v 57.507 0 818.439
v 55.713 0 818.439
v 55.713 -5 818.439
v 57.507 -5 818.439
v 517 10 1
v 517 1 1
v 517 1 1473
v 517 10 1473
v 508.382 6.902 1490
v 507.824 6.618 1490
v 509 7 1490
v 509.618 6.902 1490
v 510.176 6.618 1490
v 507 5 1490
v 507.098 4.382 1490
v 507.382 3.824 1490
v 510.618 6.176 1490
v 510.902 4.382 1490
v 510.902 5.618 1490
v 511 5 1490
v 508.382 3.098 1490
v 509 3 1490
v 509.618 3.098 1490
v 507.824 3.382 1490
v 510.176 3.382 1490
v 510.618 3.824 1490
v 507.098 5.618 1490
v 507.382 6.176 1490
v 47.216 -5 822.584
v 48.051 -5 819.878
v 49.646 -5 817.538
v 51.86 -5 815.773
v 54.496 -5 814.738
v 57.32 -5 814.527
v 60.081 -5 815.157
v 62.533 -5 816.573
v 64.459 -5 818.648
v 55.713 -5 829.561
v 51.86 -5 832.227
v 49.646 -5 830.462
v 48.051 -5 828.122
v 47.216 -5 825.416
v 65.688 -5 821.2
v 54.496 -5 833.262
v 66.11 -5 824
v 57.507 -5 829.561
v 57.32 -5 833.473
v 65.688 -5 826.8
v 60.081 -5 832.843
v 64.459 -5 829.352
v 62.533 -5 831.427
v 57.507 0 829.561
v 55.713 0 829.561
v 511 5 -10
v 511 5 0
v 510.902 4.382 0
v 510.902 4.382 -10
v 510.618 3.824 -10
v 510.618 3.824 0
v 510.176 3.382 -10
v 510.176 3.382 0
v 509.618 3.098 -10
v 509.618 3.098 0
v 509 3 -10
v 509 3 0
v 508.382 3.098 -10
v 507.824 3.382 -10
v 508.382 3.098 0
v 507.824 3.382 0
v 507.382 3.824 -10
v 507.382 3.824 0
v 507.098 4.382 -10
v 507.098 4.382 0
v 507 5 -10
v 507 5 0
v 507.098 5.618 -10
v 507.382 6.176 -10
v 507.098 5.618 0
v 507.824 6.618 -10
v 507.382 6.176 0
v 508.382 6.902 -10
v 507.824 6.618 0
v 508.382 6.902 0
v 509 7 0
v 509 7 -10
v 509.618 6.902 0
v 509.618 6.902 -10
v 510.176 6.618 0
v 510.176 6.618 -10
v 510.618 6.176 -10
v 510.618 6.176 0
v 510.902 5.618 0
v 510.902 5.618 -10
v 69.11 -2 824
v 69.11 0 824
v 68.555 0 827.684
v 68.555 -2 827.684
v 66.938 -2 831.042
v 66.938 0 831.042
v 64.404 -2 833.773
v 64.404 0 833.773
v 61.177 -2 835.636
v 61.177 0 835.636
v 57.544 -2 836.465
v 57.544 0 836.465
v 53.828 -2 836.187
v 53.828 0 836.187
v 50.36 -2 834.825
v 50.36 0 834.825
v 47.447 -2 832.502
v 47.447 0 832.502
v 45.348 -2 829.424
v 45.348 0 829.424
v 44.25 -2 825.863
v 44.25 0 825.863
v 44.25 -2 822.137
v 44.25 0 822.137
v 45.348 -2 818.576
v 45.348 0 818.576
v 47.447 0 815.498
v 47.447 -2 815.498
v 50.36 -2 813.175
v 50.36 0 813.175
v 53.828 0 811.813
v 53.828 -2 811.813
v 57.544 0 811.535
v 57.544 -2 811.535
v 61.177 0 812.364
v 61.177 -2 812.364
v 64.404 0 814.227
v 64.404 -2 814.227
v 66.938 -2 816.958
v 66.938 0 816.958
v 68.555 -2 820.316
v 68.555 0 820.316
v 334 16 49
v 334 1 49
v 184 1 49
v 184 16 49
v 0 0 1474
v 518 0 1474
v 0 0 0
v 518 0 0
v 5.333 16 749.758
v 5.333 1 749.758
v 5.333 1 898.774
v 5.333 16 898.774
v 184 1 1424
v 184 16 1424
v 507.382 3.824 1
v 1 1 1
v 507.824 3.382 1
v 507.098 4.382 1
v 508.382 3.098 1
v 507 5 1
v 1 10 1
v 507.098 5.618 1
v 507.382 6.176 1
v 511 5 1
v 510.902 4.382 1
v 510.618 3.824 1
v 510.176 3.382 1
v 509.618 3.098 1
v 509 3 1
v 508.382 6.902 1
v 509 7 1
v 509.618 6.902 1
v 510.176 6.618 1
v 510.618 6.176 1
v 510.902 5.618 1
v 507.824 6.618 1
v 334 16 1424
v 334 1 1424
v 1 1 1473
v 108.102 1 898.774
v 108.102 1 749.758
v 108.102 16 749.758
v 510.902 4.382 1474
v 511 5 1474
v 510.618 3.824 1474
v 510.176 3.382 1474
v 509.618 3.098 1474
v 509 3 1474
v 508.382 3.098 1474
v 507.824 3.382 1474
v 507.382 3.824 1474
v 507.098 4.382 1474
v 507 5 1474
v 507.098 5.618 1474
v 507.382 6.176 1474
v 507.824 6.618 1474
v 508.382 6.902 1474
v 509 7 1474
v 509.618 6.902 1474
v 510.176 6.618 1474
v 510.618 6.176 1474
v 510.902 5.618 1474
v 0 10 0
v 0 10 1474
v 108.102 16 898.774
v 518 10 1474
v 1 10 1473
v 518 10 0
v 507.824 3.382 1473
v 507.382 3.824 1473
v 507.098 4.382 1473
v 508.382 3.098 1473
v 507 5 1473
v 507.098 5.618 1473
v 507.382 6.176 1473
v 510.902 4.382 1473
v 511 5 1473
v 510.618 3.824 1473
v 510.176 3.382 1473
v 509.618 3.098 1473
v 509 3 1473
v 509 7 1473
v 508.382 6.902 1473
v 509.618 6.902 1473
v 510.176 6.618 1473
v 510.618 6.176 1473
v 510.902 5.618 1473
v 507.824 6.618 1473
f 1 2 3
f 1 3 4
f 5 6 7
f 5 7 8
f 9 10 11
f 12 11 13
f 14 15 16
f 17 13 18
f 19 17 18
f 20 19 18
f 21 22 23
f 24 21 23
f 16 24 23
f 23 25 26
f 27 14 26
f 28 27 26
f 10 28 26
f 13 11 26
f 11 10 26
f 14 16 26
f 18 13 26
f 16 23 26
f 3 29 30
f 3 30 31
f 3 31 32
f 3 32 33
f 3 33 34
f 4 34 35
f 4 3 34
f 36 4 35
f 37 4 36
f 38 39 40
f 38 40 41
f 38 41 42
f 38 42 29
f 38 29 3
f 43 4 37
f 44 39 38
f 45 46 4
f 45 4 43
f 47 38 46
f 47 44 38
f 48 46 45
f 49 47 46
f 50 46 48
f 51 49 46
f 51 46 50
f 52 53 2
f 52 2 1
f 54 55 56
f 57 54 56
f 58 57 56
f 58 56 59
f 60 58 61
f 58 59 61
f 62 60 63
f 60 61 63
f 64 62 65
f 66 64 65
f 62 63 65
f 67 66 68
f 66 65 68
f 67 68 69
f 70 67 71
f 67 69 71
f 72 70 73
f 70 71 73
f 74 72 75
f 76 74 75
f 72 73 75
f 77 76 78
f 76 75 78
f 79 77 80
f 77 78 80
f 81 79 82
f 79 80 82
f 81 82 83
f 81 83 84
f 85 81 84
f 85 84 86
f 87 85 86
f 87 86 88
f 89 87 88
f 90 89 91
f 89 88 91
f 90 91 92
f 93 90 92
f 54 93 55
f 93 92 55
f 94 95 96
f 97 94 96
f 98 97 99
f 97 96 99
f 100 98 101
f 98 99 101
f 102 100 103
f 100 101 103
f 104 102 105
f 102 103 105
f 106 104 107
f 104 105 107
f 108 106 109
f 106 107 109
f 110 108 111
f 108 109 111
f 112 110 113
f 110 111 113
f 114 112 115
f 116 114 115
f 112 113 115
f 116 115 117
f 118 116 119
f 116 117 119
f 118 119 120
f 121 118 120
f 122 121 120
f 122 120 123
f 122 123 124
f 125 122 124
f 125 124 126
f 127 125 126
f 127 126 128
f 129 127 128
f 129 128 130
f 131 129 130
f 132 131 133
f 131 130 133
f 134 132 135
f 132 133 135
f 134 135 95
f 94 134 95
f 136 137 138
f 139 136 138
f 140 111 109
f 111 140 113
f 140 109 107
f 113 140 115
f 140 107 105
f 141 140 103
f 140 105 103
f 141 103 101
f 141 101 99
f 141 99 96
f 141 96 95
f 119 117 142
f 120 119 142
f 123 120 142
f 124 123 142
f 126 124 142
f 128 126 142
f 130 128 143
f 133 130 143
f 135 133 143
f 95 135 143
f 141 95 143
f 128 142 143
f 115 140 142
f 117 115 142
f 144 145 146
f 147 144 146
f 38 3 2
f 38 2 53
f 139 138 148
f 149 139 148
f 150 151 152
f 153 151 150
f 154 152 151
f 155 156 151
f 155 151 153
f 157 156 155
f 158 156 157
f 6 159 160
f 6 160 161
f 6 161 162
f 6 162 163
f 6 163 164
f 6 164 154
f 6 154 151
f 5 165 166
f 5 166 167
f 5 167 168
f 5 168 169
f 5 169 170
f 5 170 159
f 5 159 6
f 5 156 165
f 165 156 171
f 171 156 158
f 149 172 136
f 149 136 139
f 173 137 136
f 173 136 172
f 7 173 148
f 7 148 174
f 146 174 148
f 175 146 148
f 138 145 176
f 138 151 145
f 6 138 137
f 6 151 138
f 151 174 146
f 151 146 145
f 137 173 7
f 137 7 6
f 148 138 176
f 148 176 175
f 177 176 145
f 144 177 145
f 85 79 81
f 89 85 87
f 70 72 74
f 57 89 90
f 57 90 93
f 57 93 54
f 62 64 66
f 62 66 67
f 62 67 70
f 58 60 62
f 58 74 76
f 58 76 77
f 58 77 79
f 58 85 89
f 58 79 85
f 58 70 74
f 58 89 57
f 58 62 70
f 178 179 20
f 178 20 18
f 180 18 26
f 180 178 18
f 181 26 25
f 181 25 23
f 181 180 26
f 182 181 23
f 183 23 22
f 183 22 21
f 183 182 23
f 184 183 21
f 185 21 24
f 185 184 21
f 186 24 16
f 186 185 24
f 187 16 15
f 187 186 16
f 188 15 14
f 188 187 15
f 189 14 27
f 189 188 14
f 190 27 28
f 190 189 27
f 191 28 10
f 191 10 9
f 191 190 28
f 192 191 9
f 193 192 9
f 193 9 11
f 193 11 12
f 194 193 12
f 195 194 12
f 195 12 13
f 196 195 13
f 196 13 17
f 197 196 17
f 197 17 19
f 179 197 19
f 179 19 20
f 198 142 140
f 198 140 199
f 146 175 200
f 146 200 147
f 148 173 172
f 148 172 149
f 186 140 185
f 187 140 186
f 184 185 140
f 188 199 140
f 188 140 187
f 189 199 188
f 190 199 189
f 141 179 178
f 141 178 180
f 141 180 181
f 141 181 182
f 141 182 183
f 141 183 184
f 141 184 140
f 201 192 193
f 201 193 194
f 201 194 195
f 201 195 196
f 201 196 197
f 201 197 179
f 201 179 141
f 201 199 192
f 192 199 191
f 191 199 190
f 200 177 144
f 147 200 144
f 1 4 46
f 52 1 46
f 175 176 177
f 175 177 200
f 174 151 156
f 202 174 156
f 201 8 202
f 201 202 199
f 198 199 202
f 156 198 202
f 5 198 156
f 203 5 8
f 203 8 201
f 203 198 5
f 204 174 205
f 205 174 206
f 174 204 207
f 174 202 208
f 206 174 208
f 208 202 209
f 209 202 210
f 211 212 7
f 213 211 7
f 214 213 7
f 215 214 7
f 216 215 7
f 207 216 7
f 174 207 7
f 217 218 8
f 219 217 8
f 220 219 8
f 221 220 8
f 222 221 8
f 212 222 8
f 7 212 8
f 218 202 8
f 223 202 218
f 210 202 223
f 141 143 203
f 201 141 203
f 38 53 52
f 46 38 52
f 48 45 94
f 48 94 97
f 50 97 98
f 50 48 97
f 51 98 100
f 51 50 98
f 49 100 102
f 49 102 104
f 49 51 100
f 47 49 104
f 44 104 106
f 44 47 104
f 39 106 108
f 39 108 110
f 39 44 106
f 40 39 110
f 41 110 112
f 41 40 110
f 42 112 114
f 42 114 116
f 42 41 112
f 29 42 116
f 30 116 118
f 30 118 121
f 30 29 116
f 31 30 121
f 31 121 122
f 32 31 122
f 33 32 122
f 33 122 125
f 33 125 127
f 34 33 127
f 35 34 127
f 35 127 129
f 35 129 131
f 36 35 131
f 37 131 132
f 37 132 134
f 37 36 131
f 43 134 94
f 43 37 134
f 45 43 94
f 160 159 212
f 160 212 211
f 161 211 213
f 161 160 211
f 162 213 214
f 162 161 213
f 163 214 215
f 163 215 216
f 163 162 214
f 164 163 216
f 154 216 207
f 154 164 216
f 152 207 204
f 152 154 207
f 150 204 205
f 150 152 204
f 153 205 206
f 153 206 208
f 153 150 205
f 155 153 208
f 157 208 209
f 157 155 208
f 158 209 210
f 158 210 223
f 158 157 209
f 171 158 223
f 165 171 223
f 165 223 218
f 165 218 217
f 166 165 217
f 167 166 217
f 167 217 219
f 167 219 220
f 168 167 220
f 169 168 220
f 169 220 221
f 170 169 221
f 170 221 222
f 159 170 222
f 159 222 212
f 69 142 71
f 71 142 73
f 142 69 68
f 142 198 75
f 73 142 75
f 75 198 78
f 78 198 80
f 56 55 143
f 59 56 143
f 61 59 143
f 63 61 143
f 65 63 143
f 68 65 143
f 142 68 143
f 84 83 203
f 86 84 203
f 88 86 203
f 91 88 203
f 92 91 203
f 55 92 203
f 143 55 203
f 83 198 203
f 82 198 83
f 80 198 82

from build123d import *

# Parameters (mm, degrees)
F0_W          = 518
F0_H          = 10
F1_DEPTH      = 1474
F2_T          = -1
F3_R          = 2
F4_DEPTH      = 10
F4_DEPTH_BACK = 1490
F5_R          = 12.5
F6_DEPTH      = 5
F7_SIZE       = 3
F8_W          = 1.794569
F8_H          = 11.12199
F9_DEPTH      = 5
F10_W         = 102.76919
F10_H         = 149.015308
F11_DEPTH     = 15
F12_W         = 150
F12_H         = 1375
F13_DEPTH     = 15


with BuildPart() as f1:
    # F0 (on Top) → F1 (new body)
    with BuildSketch(Plane.XY):
        with Locations((259, 5)):
            Rectangle(F0_W, F0_H)
    extrude(amount=F1_DEPTH)

    # F2
    f2_openings = [f1.faces().sort_by_distance(p)[0] for p in [
        (259, 10, 737),
    ]]
    offset(amount=F2_T, openings=f2_openings)

    # F3 (on face) → F4 (join, two sides)
    with BuildSketch(Plane(origin=(0, 0, 0), x_dir=(1, 0, 0), z_dir=(0, 0, -1))) as f4_sk:
        with Locations((509, -5)):
            Circle(F3_R)
    extrude(amount=F4_DEPTH)
    extrude(f4_sk.sketch, amount=-F4_DEPTH_BACK)

    # F5 (on face) → F6 (join)
    with BuildSketch(Plane.XZ):
        with Locations((56.609962, 824)):
            Circle(F5_R)
    extrude(amount=F6_DEPTH)

    # F7
    f7_edges = [f1.edges().sort_by_distance(p)[0] for p in [
        (44.109962, -5, 824),
    ]]
    chamfer(f7_edges, length=F7_SIZE)

    # F8 (on face) → F9 (cut)
    with BuildSketch(Plane.XZ.offset(5)):
        with Locations((56.609962, 824)):
            Rectangle(F8_W, F8_H)
    extrude(amount=-F9_DEPTH, mode=Mode.SUBTRACT)

    # F10 (on face) → F11 (join)
    with BuildSketch(Plane(origin=(0, 1, 0), x_dir=(-1, 0, 0), z_dir=(0, 1, 0))):
        with Locations((-56.717325, 824.265957)):
            Rectangle(F10_W, F10_H)
    extrude(amount=F11_DEPTH)

    # F12 (on face) → F13 (join)
    with BuildSketch(Plane(origin=(0, 1, 0), x_dir=(-1, 0, 0), z_dir=(0, 1, 0))):
        with Locations((-259, 736.5)):
            Rectangle(F12_W, F12_H)
    extrude(amount=F13_DEPTH)


solid = f1.part
